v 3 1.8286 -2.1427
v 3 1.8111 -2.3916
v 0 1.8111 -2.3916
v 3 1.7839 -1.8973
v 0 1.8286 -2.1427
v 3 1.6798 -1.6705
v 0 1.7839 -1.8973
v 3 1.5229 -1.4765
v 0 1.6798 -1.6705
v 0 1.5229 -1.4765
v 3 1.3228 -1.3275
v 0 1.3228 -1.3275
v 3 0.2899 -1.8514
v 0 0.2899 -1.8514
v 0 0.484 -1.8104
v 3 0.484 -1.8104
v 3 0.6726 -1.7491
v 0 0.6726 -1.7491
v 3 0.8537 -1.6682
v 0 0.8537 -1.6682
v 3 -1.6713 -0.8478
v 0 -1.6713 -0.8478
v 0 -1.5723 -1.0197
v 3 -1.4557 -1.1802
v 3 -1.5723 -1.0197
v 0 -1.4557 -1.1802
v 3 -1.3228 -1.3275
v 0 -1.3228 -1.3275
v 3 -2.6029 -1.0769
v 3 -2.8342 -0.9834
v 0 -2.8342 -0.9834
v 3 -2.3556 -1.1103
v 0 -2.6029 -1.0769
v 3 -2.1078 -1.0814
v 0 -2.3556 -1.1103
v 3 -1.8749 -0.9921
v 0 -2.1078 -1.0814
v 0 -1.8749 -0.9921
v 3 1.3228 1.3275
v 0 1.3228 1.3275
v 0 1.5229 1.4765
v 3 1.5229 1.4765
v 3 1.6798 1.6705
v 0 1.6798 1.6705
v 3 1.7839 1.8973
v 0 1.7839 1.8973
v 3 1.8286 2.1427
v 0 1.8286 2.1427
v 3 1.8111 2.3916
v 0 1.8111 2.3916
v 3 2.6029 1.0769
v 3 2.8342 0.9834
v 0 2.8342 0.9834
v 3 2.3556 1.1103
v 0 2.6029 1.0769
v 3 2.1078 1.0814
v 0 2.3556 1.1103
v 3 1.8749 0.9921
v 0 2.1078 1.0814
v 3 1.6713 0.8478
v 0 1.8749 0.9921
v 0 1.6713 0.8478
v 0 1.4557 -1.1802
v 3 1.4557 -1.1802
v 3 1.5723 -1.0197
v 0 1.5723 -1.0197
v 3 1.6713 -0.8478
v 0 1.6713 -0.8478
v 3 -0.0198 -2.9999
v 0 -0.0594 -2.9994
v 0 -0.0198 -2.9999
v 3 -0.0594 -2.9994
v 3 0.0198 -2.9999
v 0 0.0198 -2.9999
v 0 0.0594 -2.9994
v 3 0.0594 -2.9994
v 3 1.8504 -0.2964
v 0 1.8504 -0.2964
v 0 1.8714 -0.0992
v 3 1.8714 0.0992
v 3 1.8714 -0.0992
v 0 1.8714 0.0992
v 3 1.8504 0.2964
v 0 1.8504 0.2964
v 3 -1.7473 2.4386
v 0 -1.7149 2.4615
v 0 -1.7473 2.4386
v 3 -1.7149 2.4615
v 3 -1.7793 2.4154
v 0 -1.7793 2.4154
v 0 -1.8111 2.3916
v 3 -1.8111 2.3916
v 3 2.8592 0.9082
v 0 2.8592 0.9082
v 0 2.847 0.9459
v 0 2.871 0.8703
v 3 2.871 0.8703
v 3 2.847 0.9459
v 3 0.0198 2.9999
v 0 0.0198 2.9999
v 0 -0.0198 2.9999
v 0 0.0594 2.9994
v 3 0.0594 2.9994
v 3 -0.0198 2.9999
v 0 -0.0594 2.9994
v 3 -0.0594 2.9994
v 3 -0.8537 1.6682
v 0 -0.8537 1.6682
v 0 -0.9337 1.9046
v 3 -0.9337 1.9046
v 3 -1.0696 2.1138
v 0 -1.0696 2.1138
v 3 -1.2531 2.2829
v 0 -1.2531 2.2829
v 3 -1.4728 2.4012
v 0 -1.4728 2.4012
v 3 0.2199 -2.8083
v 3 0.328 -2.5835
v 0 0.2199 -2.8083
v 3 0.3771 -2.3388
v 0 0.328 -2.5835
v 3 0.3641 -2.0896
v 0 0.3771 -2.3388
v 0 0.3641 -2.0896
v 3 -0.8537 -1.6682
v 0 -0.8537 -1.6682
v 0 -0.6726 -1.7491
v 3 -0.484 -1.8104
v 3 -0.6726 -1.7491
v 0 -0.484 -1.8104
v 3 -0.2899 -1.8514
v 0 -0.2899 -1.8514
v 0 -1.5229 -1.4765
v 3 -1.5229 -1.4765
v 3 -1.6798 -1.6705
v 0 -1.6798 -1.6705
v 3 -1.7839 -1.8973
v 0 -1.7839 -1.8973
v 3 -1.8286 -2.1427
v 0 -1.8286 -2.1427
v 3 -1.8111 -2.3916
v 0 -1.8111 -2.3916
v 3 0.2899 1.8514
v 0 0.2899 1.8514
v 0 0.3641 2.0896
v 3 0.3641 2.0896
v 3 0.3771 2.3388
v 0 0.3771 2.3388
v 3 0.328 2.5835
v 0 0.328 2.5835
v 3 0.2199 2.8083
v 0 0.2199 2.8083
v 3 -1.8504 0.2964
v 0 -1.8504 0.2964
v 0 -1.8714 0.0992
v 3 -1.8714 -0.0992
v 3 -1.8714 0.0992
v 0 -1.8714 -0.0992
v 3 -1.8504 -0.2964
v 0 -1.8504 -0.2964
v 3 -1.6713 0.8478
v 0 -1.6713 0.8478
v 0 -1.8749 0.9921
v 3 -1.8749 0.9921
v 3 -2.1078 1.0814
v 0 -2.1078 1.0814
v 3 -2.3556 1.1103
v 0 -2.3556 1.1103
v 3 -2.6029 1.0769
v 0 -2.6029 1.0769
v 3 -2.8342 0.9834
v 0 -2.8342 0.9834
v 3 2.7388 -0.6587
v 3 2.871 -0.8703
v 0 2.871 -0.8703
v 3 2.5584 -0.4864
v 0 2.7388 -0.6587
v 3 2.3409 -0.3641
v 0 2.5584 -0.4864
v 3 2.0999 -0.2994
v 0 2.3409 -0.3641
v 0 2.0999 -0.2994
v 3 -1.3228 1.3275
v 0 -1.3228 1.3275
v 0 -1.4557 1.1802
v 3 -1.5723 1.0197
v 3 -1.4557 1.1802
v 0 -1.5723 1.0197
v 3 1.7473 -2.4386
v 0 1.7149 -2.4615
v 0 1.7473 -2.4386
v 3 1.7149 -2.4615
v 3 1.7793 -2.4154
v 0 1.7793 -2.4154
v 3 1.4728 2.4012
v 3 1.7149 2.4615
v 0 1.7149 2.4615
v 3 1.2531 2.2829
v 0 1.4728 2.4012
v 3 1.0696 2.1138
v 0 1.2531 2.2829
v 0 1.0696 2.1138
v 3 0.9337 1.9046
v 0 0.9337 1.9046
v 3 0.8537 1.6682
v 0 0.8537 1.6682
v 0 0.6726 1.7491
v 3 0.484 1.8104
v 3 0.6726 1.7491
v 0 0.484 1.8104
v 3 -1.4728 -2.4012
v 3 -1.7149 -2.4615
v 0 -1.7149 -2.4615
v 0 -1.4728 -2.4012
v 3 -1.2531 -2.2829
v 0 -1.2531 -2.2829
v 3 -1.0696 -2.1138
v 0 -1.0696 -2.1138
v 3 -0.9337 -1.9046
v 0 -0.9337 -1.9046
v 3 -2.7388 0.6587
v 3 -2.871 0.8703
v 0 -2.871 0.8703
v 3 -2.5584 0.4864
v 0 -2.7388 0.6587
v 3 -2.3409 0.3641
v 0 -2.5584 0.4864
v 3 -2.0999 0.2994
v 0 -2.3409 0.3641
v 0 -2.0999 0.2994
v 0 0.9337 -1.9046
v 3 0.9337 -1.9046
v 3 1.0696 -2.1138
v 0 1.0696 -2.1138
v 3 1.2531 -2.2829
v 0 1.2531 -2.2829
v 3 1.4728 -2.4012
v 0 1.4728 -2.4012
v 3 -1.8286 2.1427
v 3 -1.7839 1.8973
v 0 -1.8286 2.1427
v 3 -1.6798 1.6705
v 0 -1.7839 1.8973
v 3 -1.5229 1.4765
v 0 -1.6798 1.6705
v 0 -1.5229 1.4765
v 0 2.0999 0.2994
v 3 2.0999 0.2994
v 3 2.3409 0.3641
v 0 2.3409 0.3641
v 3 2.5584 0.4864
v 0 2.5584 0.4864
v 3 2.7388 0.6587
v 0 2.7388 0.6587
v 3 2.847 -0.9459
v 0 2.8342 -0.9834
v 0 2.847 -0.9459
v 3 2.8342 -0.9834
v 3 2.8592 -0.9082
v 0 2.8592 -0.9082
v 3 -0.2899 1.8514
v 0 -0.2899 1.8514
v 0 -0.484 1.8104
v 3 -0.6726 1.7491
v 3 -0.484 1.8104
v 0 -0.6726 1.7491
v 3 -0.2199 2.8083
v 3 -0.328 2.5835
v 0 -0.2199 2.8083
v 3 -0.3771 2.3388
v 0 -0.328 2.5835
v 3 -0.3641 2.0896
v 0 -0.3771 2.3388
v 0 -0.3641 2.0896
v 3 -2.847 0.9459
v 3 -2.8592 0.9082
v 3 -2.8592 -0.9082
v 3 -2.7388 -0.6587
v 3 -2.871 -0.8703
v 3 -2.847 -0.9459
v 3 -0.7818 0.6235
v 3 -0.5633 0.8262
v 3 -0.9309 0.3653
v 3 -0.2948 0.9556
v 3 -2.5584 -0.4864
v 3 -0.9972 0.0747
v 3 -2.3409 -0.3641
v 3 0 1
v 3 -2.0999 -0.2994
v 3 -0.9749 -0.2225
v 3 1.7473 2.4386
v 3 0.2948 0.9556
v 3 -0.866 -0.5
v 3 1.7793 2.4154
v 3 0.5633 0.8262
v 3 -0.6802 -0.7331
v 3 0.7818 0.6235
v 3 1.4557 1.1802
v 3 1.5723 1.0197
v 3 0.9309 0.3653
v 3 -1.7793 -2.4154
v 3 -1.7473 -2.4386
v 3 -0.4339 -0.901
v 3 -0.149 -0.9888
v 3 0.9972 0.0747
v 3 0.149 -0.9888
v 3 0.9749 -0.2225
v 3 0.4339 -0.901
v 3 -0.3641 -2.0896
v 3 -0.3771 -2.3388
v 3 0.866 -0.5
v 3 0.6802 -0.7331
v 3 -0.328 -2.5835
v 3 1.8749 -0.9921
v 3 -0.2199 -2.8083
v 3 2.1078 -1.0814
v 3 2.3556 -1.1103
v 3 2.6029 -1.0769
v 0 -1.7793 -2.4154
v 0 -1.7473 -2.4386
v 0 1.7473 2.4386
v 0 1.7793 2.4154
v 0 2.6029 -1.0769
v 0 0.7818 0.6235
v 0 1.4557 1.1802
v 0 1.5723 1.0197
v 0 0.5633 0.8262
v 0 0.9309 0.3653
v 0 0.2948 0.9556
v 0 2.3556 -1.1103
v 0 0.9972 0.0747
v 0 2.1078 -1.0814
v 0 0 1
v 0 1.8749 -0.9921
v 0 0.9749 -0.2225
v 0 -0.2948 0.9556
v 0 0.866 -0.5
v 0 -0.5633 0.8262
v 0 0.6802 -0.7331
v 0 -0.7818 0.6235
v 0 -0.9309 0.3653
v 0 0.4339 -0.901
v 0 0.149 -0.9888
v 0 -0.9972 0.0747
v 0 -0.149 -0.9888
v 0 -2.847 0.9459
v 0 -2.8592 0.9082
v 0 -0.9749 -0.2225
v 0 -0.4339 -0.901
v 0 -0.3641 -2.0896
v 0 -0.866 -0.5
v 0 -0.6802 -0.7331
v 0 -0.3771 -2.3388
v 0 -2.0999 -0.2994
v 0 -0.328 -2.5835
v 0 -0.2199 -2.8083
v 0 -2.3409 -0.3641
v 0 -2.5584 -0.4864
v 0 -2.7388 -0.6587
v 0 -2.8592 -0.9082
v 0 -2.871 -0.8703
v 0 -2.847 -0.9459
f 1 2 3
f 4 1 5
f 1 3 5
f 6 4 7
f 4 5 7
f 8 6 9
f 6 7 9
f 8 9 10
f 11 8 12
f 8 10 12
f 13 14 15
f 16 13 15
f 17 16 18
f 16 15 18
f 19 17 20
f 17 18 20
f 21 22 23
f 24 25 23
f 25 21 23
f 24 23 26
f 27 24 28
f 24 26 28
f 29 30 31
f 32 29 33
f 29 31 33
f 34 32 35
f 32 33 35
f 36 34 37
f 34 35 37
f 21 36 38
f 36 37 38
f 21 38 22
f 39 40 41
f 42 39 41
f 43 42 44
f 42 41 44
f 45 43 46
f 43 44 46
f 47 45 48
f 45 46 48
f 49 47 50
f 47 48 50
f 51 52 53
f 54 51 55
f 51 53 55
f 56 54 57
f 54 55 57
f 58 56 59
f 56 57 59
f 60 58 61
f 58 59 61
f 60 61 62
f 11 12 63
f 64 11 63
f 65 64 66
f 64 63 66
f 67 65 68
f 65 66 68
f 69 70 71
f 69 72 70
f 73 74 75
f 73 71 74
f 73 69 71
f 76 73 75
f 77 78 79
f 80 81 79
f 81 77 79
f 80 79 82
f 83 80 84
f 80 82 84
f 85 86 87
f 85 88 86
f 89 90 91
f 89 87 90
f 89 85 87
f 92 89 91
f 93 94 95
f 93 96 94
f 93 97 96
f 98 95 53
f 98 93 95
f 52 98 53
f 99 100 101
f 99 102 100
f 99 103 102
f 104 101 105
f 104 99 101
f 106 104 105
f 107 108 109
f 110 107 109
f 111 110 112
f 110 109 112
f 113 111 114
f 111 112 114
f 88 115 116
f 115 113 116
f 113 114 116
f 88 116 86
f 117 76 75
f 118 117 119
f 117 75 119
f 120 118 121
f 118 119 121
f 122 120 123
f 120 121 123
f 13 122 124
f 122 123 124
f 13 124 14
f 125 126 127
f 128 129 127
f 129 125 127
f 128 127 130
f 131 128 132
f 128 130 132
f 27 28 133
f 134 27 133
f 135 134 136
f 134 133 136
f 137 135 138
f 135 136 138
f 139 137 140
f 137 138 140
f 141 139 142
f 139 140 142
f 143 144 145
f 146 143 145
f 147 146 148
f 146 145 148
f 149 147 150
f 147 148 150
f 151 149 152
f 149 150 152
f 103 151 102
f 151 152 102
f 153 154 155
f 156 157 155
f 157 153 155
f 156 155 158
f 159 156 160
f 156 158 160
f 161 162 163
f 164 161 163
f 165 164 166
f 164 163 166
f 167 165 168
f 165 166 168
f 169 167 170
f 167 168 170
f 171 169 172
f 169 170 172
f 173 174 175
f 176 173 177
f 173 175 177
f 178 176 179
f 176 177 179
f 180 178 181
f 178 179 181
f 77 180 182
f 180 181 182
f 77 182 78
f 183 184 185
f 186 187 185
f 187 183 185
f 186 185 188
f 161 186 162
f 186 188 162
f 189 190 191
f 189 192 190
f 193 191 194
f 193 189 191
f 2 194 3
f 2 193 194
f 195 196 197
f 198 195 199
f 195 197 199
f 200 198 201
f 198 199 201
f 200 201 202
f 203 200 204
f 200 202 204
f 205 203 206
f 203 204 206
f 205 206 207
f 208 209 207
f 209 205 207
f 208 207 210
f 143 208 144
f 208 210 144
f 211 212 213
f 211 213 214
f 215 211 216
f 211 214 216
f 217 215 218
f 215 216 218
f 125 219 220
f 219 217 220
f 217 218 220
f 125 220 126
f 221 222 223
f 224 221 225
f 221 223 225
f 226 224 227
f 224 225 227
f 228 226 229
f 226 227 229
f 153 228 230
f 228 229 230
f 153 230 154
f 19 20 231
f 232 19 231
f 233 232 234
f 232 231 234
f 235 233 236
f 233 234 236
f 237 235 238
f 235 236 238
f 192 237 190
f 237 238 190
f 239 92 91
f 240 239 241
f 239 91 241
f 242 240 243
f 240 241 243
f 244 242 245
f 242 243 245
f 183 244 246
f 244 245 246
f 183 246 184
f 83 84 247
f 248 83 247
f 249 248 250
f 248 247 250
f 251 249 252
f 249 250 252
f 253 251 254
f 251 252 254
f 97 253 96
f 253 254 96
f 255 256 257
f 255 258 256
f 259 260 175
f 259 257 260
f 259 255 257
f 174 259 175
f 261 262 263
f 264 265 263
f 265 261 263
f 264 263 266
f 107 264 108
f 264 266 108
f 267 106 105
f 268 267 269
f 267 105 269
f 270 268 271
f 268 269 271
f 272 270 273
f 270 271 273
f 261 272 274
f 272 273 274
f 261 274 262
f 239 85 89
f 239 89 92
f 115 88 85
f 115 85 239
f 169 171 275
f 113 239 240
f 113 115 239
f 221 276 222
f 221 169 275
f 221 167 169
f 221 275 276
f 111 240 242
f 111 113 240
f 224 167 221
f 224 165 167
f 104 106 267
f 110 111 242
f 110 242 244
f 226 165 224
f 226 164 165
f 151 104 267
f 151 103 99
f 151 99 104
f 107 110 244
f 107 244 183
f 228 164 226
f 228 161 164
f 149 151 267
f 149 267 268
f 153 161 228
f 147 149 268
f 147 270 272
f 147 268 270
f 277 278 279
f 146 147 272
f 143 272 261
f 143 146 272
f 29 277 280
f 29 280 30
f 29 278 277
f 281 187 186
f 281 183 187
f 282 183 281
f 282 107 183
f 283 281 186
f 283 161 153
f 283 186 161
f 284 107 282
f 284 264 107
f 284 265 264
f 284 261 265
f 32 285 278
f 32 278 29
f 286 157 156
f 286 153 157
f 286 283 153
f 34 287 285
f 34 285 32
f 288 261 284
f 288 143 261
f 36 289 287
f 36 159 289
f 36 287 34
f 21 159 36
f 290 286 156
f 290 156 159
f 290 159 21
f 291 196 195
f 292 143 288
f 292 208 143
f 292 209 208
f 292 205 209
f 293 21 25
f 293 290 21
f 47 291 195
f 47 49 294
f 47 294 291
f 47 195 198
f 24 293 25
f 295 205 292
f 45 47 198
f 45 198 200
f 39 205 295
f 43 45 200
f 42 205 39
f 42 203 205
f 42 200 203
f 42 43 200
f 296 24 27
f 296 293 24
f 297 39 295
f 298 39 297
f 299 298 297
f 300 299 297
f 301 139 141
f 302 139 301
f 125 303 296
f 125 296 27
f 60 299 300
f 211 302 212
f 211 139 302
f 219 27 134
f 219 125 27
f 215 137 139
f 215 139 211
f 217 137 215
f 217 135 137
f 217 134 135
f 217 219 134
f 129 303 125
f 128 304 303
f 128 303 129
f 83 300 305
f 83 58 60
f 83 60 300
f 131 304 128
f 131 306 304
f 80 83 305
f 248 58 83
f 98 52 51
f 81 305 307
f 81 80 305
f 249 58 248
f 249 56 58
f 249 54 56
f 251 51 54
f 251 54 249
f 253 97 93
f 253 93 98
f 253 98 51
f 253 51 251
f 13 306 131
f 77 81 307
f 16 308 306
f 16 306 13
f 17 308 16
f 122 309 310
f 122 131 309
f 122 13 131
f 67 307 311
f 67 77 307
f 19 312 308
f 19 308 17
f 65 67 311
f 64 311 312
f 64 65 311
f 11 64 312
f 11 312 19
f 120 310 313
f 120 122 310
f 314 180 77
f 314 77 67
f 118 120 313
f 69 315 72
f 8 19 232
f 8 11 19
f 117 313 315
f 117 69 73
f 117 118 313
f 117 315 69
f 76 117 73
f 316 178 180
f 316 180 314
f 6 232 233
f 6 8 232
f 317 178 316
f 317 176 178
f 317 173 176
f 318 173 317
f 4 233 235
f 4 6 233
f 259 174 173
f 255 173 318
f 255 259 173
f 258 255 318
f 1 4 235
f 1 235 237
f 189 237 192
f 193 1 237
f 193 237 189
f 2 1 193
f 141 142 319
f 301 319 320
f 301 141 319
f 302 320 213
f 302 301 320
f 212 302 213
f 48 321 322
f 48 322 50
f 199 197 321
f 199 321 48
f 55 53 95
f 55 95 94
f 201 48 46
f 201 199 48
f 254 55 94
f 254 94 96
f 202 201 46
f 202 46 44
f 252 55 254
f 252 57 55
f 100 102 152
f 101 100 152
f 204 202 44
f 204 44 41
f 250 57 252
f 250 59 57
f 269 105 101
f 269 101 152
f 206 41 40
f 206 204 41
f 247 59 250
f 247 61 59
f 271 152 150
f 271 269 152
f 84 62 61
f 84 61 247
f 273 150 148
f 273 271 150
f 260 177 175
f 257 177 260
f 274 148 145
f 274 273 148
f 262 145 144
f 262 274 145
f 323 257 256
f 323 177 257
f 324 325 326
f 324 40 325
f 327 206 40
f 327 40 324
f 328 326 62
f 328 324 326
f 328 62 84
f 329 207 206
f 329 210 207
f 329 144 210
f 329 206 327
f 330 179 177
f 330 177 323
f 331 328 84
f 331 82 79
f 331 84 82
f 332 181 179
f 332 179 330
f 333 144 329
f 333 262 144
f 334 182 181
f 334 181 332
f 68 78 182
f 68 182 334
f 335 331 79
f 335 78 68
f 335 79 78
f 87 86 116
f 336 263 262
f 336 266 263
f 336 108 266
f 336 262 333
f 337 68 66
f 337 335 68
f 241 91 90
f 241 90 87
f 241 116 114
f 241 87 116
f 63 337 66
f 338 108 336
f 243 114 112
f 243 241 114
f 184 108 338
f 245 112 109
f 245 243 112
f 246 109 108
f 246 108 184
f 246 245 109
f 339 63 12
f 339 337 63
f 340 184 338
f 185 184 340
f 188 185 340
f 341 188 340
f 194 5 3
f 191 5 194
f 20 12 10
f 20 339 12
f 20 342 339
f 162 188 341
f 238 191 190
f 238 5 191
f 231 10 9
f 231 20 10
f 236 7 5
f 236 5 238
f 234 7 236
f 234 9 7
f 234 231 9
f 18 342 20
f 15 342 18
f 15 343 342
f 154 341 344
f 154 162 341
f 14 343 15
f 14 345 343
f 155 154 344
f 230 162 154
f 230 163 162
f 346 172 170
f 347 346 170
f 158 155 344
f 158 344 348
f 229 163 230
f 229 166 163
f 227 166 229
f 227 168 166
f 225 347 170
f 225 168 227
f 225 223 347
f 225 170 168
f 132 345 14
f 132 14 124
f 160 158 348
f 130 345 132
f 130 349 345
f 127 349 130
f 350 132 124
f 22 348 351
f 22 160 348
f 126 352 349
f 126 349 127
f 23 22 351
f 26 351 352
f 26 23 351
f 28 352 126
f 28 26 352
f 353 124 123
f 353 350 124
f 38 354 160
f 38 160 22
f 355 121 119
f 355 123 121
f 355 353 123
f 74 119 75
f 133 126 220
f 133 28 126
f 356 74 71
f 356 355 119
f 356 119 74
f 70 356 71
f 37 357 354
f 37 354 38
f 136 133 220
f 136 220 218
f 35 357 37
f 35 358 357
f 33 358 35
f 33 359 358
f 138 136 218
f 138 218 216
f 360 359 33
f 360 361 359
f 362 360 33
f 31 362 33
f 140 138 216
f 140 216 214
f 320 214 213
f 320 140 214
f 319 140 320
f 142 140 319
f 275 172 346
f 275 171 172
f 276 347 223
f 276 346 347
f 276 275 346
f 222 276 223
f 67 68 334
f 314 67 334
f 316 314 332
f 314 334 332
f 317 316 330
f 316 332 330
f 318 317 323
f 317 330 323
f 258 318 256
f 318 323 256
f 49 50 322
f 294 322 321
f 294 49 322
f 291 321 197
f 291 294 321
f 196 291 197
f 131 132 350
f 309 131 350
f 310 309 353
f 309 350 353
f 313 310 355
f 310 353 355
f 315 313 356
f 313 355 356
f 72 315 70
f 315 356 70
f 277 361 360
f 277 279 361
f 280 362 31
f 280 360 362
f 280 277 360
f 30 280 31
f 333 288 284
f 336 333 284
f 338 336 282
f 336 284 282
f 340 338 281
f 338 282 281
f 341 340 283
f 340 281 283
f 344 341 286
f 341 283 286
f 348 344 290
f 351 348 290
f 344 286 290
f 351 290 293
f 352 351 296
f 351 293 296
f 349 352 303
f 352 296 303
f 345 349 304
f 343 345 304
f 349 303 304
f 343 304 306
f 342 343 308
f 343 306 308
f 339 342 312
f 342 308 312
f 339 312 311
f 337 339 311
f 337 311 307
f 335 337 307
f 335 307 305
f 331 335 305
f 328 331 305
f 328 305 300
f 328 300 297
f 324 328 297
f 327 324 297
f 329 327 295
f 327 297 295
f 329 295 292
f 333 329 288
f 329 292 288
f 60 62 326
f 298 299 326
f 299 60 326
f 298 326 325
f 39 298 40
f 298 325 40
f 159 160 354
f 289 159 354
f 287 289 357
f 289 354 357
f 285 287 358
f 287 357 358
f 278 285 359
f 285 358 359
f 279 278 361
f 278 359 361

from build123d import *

# Parameters (mm, degrees)
BASPROSKE_W           = 12
BASPROSKE_H           = 3
TOOTHCUT_DEPTH        = 13.727922061
TEETHCUTS_COUNT       = 10
TEETHCUTS_ANGLE       = 324
BORSKE_R              = 1
BORE_DEPTH            = 50.0000508
CROQUIS1_W            = 7.363545147
CROQUIS1_H            = 6.569840322
CORTAR_EXTRUIR1_DEPTH = 9


with BuildPart() as part:
    # BasProSke → Base-Revolve (revolve)
    with BuildSketch(Plane(origin=(0, 0, 0), x_dir=(1, 0, 0), z_dir=(0, 1, 0)), mode=Mode.PRIVATE) as base_revolve_sk:
        with Locations((6, 1.5)):
            Rectangle(BASPROSKE_W, BASPROSKE_H)
    revolve(base_revolve_sk.sketch.rotate(Axis((-10, 0, 0), (1, 0, 0)), 180), axis=Axis((-10, 0, 0), (1, 0, 0)))

    # TooCutSke → ToothCut (cut, through all)
    with BuildSketch(Plane(origin=(0, 0, 0), x_dir=(0, 0, -1), z_dir=(1, 0, 0))):
        with BuildLine():
            ThreePointArc((0.296449938, 1.850403587), (0, 1.874), (-0.296449938, 1.850403587))
            ThreePointArc((-0.296449938, 1.850403587), (-0.428089565, 2.470295585), (-0.905889751, 2.886591228))
            ThreePointArc((-0.905889751, 2.886591228), (0, 3.0254), (0.905889751, 2.886591228))
            ThreePointArc((0.905889751, 2.886591228), (0.428089565, 2.470295585), (0.296449938, 1.850403587))
        make_face()
    toothcut = extrude(amount=TOOTHCUT_DEPTH, mode=Mode.SUBTRACT)

    # TeethCuts: ToothCut ×10 about axis
    teethcuts_axis = Axis((-10, 0, 0), (1, 0, 0))
    for i in range(1, TEETHCUTS_COUNT):
        add(toothcut.rotate(teethcuts_axis, i * TEETHCUTS_ANGLE / (TEETHCUTS_COUNT - 1)), mode=Mode.SUBTRACT)

    # BorSke → Bore (cut, symmetric)
    with BuildSketch(Plane(origin=(0, 0, 0), x_dir=(0, 0, -1), z_dir=(1, 0, 0))):
        with Locations(Location((0, 0, 0), (0, 0, 180))):
            Circle(BORSKE_R)
    extrude(amount=BORE_DEPTH, both=True, mode=Mode.SUBTRACT)

    # Croquis1 → Cortar-Extruir1 (cut)
    with BuildSketch(Plane(origin=(12, 0, 0), x_dir=(0, 0, -1), z_dir=(1, 0, 0))):
        with Locations((0.087787386, 0.060578549)):
            Rectangle(CROQUIS1_W, CROQUIS1_H)
    extrude(amount=-CORTAR_EXTRUIR1_DEPTH, mode=Mode.SUBTRACT)


solid = part.part
